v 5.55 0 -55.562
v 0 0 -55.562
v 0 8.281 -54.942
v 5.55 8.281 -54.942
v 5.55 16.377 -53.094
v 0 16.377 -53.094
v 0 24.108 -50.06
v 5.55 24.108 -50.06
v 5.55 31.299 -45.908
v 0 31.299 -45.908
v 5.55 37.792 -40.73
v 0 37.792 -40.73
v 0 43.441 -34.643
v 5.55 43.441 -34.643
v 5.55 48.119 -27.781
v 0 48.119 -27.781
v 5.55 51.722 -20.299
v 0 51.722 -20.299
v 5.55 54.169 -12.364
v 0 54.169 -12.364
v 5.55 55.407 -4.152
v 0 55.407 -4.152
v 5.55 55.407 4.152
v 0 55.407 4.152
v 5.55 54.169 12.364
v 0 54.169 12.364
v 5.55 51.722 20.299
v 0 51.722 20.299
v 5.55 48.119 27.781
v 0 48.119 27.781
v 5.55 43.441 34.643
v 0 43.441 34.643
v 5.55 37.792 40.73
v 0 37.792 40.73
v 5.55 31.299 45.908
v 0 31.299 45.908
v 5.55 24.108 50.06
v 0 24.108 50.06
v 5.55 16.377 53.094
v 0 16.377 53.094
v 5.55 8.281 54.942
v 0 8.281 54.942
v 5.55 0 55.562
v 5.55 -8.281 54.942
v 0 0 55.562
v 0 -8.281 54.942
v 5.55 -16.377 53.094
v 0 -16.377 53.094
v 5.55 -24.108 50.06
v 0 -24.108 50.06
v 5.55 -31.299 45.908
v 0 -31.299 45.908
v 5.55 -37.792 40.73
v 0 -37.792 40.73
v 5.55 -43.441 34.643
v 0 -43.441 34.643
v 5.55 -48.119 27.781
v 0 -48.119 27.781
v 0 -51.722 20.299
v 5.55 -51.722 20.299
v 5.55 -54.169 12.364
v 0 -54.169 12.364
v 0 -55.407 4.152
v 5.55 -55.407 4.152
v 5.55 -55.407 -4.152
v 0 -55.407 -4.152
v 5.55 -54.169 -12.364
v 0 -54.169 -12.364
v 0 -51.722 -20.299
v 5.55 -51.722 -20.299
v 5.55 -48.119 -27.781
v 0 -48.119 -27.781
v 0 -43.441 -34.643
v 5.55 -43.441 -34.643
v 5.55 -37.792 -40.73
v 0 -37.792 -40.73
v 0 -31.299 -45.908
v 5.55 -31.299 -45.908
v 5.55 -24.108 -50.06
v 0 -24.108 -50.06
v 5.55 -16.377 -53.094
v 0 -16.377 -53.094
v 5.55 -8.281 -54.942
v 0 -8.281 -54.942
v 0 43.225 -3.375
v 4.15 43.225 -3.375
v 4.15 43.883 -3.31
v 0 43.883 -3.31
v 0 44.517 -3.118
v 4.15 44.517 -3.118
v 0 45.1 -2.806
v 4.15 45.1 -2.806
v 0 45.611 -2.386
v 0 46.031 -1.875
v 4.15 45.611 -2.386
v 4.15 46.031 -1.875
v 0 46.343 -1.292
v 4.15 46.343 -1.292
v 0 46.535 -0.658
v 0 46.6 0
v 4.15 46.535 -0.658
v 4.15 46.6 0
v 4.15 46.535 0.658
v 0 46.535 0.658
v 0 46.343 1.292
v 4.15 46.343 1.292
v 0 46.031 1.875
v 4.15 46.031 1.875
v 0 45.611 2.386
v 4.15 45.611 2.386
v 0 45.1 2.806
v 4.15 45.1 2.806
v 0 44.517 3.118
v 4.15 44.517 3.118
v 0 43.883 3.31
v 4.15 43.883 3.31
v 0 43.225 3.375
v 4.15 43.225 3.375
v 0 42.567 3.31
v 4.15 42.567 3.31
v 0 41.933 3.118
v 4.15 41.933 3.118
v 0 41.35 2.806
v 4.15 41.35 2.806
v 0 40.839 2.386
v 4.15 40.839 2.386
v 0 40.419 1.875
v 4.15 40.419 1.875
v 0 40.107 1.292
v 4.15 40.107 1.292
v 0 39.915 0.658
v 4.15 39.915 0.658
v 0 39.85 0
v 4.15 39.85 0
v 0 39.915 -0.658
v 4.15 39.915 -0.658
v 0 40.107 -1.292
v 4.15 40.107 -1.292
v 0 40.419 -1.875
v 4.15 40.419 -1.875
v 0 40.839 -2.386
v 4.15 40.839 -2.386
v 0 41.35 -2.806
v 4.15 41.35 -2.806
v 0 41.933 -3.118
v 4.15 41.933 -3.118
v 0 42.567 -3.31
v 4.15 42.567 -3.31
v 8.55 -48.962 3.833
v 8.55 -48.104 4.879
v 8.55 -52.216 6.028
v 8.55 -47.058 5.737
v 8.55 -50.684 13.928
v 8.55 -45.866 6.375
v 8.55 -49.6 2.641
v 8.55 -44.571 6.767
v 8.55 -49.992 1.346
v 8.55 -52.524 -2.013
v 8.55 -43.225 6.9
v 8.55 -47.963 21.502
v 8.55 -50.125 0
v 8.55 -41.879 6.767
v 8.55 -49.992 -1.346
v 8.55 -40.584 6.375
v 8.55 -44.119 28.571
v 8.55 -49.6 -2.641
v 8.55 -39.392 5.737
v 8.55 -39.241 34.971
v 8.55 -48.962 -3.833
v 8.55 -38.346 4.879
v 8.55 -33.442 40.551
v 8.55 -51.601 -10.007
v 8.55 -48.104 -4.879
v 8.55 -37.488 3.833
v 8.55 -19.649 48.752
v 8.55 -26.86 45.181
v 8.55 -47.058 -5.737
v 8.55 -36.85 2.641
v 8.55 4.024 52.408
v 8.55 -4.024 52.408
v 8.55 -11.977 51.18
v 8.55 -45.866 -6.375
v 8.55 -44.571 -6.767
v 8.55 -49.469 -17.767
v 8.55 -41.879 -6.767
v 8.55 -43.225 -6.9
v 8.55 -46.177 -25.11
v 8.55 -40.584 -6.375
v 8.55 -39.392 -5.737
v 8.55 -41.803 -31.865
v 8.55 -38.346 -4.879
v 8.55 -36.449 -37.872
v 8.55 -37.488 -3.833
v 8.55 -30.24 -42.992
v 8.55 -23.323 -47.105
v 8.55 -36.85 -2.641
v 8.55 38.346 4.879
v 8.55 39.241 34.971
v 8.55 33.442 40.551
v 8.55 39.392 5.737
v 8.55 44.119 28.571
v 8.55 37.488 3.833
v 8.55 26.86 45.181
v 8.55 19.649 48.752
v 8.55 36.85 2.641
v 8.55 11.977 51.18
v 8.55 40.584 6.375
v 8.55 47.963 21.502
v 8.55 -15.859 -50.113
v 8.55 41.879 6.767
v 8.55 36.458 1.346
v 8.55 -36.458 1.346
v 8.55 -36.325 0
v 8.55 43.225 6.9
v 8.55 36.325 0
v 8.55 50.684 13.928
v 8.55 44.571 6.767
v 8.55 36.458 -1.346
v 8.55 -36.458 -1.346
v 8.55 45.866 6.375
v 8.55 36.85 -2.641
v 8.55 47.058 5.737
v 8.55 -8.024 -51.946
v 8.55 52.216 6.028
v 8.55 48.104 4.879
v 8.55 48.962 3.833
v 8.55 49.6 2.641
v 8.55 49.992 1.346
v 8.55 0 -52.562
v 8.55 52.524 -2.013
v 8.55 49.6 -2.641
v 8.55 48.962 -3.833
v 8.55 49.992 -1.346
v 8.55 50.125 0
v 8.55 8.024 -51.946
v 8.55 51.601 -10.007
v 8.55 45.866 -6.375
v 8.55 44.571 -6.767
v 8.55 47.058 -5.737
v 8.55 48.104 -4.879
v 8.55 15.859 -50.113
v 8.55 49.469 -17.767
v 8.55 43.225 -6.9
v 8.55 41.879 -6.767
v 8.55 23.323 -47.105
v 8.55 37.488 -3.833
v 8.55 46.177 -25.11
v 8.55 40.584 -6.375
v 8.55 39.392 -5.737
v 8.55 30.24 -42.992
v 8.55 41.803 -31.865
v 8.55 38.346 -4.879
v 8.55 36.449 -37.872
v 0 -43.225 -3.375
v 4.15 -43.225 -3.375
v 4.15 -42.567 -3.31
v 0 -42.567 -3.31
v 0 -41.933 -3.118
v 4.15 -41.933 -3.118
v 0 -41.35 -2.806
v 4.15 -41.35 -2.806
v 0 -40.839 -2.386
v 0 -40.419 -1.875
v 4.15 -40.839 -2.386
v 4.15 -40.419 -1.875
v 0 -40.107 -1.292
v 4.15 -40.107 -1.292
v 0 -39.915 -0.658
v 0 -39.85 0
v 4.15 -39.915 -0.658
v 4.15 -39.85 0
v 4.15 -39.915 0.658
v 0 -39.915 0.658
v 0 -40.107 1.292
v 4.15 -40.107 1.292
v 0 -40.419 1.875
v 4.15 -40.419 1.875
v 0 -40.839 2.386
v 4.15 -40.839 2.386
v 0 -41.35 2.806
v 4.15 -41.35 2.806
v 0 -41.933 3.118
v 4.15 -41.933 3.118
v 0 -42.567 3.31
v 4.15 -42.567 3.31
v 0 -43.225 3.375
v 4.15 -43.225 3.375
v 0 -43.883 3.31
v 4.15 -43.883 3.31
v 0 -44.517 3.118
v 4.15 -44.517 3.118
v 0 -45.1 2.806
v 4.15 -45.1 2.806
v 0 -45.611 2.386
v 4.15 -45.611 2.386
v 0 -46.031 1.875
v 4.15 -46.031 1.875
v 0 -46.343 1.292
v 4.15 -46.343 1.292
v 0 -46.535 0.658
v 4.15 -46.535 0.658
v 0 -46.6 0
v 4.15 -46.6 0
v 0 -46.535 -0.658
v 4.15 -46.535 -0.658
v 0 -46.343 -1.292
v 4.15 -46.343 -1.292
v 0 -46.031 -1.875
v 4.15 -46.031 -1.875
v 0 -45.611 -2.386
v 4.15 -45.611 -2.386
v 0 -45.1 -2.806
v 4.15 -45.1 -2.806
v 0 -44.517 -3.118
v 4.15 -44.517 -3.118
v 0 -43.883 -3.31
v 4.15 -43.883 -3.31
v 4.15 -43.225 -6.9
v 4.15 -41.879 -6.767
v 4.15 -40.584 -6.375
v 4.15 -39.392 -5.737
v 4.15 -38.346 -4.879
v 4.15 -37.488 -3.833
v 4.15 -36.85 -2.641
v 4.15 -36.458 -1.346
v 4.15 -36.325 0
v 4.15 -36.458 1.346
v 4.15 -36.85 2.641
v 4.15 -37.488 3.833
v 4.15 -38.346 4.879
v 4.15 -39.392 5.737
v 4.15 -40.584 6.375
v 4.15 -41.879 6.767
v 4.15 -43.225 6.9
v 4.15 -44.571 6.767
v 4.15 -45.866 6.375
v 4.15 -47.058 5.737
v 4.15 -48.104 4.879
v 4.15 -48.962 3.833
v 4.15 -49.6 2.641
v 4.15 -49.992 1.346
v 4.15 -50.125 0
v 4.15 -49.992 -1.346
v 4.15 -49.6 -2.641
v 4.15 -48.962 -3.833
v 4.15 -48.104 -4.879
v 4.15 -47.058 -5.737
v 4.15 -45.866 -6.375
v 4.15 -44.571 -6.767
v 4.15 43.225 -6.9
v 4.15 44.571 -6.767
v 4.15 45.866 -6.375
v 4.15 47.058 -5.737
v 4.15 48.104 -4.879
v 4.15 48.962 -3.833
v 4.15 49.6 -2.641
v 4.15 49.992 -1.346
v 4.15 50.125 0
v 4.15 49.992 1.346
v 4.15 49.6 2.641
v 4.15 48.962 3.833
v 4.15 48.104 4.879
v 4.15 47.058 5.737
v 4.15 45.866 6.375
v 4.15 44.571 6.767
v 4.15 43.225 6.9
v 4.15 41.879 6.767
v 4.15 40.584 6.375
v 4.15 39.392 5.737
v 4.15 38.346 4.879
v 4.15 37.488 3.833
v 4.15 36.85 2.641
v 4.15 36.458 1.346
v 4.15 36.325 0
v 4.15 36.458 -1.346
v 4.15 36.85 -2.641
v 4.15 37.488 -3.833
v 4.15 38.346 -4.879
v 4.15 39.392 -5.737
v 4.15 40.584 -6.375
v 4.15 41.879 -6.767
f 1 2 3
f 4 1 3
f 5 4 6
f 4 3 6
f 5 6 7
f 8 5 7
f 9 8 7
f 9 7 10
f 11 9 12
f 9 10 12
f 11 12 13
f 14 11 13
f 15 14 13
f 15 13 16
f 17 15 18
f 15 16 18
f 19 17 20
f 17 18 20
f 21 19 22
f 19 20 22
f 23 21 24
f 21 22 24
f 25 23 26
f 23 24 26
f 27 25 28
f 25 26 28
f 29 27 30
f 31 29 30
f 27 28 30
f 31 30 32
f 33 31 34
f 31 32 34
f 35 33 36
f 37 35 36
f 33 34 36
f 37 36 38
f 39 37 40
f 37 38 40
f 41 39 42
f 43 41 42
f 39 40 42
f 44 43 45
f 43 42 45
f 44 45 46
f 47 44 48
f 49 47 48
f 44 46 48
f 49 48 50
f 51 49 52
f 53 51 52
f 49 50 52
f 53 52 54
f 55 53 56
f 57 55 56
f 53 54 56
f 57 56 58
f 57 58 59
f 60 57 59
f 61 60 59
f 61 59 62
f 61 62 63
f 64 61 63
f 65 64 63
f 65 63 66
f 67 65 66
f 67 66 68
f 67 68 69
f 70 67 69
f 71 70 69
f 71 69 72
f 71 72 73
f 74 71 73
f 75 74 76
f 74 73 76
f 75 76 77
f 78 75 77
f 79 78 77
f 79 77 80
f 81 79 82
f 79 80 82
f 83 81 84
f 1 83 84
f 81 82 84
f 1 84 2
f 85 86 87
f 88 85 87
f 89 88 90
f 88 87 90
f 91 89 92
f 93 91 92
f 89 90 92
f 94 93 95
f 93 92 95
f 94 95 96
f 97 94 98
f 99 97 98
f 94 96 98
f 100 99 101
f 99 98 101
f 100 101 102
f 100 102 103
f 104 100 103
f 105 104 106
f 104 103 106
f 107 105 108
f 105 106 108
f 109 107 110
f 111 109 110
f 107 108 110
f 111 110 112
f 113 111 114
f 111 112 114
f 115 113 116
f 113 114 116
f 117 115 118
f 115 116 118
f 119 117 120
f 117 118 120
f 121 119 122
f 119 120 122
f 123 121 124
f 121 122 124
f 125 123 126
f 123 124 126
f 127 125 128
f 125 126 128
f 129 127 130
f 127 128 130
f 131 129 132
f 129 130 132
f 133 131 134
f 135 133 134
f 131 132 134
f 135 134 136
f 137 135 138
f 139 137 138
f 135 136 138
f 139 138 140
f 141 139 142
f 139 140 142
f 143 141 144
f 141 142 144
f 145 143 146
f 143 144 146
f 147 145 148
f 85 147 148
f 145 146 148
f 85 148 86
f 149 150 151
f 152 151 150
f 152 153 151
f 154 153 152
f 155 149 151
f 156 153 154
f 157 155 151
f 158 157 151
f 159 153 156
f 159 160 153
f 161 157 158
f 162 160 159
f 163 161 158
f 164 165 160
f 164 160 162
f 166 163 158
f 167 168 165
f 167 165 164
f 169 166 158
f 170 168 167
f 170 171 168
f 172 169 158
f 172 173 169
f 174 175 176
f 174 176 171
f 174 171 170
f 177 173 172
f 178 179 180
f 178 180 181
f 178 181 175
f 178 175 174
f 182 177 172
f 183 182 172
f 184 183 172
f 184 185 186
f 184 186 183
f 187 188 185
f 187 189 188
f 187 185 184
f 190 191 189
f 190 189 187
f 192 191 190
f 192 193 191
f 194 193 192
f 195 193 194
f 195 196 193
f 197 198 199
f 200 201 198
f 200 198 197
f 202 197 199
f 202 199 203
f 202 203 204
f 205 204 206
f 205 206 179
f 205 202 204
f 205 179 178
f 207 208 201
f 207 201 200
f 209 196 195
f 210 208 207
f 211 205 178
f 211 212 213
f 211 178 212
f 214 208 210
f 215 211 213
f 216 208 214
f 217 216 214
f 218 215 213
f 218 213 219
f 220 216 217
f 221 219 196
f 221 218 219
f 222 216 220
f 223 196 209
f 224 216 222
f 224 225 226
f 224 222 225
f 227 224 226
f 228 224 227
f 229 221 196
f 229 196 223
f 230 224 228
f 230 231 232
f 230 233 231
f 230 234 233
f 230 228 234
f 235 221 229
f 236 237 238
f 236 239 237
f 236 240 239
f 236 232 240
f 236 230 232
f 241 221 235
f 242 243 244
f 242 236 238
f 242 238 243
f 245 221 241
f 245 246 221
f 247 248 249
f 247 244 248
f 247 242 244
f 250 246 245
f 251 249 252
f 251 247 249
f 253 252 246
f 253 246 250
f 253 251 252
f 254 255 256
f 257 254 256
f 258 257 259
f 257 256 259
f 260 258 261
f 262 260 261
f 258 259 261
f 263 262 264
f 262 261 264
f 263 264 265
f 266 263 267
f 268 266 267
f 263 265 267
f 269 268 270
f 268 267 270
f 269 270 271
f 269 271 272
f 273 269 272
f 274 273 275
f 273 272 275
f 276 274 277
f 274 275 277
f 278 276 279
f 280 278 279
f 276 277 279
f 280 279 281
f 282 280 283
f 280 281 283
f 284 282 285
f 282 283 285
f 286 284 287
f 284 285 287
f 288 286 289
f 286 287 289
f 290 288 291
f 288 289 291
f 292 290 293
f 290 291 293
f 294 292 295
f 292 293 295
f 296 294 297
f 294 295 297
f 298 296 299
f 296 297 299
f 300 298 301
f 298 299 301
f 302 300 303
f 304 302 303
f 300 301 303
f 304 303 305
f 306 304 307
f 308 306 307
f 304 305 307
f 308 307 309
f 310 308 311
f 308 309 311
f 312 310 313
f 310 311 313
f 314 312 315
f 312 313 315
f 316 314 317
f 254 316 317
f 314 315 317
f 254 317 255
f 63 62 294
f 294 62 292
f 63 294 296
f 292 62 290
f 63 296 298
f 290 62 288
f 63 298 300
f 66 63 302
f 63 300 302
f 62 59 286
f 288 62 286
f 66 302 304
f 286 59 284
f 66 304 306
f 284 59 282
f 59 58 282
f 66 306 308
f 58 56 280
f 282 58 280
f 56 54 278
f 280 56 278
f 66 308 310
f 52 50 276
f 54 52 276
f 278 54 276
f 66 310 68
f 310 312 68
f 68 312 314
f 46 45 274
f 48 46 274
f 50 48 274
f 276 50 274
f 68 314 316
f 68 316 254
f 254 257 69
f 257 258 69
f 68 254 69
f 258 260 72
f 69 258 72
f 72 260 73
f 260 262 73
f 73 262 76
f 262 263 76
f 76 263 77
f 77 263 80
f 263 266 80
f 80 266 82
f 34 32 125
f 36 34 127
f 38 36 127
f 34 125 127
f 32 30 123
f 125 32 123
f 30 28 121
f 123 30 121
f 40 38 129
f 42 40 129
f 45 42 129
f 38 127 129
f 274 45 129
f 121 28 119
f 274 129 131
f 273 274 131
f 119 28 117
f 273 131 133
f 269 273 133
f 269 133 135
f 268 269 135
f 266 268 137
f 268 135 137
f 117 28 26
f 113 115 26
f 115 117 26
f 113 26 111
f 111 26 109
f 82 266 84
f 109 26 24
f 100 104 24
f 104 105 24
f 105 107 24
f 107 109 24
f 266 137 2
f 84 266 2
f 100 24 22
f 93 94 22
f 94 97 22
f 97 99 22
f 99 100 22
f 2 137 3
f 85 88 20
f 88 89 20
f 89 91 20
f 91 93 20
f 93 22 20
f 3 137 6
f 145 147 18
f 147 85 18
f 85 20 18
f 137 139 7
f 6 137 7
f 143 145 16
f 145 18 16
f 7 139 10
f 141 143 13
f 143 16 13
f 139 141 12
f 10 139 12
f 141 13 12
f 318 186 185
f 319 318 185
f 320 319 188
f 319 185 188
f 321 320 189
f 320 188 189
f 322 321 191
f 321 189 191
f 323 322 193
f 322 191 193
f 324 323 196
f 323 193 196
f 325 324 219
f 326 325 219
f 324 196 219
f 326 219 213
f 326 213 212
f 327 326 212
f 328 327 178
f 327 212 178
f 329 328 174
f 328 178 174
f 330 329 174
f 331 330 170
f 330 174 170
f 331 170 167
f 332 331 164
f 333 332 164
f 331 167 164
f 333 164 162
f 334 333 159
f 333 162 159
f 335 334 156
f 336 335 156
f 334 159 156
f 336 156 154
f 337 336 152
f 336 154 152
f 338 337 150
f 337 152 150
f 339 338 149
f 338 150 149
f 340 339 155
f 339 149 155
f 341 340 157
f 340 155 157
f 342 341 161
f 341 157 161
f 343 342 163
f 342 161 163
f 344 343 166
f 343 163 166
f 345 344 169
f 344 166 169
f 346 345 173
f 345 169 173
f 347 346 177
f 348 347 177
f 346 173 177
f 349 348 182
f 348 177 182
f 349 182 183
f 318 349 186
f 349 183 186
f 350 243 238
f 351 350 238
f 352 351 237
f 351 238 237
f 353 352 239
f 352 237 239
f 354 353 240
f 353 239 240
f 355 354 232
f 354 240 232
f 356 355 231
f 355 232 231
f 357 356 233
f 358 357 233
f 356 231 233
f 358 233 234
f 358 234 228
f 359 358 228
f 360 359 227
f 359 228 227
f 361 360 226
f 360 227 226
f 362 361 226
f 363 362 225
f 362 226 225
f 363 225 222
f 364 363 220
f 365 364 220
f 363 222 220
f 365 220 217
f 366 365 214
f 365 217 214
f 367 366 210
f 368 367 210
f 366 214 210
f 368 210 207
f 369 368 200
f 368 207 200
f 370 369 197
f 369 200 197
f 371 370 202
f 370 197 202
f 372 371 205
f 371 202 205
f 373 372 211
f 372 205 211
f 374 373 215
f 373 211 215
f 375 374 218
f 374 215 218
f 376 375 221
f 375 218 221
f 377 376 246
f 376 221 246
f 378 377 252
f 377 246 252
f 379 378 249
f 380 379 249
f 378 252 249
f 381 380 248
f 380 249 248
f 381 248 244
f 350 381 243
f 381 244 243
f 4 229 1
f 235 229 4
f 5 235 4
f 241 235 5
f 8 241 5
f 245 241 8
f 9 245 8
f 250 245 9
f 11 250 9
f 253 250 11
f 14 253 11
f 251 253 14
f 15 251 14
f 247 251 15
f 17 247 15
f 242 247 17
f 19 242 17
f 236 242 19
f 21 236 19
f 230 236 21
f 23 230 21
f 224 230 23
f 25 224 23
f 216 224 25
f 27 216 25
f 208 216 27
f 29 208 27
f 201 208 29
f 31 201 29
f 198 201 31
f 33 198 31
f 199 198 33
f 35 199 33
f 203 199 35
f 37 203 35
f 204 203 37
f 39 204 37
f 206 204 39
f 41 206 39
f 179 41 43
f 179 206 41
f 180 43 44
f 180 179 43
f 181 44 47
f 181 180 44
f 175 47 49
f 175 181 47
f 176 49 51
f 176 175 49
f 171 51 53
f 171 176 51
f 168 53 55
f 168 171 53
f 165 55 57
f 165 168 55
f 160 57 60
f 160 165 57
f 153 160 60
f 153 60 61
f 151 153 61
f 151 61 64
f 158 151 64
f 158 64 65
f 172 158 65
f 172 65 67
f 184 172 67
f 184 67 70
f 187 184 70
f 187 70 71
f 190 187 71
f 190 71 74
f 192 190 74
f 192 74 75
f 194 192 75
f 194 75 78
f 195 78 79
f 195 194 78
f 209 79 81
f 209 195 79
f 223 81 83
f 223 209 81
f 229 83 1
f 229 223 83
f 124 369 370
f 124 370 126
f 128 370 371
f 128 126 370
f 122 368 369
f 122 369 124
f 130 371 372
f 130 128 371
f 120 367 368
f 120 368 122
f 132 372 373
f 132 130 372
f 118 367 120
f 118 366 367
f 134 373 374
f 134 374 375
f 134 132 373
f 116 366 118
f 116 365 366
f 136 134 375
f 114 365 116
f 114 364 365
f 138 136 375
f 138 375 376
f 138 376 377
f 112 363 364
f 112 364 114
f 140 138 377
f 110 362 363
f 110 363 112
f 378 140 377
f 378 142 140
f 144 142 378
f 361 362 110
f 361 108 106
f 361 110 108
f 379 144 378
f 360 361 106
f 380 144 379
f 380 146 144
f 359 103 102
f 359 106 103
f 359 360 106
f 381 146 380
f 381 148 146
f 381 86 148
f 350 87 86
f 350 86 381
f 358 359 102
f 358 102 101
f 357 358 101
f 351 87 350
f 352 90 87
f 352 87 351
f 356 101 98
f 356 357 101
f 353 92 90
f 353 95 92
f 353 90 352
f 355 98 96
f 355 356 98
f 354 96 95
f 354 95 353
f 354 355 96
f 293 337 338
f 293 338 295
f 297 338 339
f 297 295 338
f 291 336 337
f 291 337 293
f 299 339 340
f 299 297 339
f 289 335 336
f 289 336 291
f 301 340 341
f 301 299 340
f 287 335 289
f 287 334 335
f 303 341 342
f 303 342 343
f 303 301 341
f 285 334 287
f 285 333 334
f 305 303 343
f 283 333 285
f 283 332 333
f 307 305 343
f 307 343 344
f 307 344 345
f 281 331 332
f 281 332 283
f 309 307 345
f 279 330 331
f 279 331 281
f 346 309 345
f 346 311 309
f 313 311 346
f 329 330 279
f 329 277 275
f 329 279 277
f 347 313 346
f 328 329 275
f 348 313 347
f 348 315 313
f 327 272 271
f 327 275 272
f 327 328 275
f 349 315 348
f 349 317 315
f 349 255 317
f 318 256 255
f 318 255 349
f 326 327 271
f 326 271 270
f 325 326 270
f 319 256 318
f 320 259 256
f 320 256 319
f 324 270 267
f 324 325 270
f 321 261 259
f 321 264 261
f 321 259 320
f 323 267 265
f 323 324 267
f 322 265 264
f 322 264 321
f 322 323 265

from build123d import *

# Parameters (mm, degrees)
SKETCH1_R           = 55.5625
BOSS_EXTRUDE1_DEPTH = 8.55
CHAMFER1_SIZE       = 3
SKETCH3_R           = 6.9
CUT_EXTRUDE1_DEPTH  = 4.4
SKETCH4_R           = 3.375
CUT_EXTRUDE2_DEPTH  = 4.15


with BuildPart() as part:
    # Sketch1 → Boss-Extrude1 (new body)
    with BuildSketch(Plane(origin=(0, 0, 0), x_dir=(0, 0, -1), z_dir=(1, 0, 0))):
        Circle(SKETCH1_R)
    extrude(amount=BOSS_EXTRUDE1_DEPTH)

    # Chamfer1
    chamfer1_edges = [part.edges().sort_by_distance(p)[0] for p in [
        (8.55, 0, 55.5625),
    ]]
    chamfer(chamfer1_edges, length=CHAMFER1_SIZE)

    # Sketch3 → Cut-Extrude1 (cut)
    with BuildSketch(Plane(origin=(8.55, 0, 0), x_dir=(0, 0, -1), z_dir=(1, 0, 0))):
        with Locations((0, 43.225)):
            Circle(SKETCH3_R)
        with Locations((0, -43.225)):
            Circle(SKETCH3_R)
    extrude(amount=-CUT_EXTRUDE1_DEPTH, mode=Mode.SUBTRACT)

    # Sketch4 → Cut-Extrude2 (cut)
    with BuildSketch(Plane(origin=(4.15, 0, 0), x_dir=(0, 0, -1), z_dir=(1, 0, 0))):
        with Locations((0, 43.225)):
            Circle(SKETCH4_R)
        with Locations((0, -43.225)):
            Circle(SKETCH4_R)
    extrude(amount=-CUT_EXTRUDE2_DEPTH, mode=Mode.SUBTRACT)


solid = part.part
